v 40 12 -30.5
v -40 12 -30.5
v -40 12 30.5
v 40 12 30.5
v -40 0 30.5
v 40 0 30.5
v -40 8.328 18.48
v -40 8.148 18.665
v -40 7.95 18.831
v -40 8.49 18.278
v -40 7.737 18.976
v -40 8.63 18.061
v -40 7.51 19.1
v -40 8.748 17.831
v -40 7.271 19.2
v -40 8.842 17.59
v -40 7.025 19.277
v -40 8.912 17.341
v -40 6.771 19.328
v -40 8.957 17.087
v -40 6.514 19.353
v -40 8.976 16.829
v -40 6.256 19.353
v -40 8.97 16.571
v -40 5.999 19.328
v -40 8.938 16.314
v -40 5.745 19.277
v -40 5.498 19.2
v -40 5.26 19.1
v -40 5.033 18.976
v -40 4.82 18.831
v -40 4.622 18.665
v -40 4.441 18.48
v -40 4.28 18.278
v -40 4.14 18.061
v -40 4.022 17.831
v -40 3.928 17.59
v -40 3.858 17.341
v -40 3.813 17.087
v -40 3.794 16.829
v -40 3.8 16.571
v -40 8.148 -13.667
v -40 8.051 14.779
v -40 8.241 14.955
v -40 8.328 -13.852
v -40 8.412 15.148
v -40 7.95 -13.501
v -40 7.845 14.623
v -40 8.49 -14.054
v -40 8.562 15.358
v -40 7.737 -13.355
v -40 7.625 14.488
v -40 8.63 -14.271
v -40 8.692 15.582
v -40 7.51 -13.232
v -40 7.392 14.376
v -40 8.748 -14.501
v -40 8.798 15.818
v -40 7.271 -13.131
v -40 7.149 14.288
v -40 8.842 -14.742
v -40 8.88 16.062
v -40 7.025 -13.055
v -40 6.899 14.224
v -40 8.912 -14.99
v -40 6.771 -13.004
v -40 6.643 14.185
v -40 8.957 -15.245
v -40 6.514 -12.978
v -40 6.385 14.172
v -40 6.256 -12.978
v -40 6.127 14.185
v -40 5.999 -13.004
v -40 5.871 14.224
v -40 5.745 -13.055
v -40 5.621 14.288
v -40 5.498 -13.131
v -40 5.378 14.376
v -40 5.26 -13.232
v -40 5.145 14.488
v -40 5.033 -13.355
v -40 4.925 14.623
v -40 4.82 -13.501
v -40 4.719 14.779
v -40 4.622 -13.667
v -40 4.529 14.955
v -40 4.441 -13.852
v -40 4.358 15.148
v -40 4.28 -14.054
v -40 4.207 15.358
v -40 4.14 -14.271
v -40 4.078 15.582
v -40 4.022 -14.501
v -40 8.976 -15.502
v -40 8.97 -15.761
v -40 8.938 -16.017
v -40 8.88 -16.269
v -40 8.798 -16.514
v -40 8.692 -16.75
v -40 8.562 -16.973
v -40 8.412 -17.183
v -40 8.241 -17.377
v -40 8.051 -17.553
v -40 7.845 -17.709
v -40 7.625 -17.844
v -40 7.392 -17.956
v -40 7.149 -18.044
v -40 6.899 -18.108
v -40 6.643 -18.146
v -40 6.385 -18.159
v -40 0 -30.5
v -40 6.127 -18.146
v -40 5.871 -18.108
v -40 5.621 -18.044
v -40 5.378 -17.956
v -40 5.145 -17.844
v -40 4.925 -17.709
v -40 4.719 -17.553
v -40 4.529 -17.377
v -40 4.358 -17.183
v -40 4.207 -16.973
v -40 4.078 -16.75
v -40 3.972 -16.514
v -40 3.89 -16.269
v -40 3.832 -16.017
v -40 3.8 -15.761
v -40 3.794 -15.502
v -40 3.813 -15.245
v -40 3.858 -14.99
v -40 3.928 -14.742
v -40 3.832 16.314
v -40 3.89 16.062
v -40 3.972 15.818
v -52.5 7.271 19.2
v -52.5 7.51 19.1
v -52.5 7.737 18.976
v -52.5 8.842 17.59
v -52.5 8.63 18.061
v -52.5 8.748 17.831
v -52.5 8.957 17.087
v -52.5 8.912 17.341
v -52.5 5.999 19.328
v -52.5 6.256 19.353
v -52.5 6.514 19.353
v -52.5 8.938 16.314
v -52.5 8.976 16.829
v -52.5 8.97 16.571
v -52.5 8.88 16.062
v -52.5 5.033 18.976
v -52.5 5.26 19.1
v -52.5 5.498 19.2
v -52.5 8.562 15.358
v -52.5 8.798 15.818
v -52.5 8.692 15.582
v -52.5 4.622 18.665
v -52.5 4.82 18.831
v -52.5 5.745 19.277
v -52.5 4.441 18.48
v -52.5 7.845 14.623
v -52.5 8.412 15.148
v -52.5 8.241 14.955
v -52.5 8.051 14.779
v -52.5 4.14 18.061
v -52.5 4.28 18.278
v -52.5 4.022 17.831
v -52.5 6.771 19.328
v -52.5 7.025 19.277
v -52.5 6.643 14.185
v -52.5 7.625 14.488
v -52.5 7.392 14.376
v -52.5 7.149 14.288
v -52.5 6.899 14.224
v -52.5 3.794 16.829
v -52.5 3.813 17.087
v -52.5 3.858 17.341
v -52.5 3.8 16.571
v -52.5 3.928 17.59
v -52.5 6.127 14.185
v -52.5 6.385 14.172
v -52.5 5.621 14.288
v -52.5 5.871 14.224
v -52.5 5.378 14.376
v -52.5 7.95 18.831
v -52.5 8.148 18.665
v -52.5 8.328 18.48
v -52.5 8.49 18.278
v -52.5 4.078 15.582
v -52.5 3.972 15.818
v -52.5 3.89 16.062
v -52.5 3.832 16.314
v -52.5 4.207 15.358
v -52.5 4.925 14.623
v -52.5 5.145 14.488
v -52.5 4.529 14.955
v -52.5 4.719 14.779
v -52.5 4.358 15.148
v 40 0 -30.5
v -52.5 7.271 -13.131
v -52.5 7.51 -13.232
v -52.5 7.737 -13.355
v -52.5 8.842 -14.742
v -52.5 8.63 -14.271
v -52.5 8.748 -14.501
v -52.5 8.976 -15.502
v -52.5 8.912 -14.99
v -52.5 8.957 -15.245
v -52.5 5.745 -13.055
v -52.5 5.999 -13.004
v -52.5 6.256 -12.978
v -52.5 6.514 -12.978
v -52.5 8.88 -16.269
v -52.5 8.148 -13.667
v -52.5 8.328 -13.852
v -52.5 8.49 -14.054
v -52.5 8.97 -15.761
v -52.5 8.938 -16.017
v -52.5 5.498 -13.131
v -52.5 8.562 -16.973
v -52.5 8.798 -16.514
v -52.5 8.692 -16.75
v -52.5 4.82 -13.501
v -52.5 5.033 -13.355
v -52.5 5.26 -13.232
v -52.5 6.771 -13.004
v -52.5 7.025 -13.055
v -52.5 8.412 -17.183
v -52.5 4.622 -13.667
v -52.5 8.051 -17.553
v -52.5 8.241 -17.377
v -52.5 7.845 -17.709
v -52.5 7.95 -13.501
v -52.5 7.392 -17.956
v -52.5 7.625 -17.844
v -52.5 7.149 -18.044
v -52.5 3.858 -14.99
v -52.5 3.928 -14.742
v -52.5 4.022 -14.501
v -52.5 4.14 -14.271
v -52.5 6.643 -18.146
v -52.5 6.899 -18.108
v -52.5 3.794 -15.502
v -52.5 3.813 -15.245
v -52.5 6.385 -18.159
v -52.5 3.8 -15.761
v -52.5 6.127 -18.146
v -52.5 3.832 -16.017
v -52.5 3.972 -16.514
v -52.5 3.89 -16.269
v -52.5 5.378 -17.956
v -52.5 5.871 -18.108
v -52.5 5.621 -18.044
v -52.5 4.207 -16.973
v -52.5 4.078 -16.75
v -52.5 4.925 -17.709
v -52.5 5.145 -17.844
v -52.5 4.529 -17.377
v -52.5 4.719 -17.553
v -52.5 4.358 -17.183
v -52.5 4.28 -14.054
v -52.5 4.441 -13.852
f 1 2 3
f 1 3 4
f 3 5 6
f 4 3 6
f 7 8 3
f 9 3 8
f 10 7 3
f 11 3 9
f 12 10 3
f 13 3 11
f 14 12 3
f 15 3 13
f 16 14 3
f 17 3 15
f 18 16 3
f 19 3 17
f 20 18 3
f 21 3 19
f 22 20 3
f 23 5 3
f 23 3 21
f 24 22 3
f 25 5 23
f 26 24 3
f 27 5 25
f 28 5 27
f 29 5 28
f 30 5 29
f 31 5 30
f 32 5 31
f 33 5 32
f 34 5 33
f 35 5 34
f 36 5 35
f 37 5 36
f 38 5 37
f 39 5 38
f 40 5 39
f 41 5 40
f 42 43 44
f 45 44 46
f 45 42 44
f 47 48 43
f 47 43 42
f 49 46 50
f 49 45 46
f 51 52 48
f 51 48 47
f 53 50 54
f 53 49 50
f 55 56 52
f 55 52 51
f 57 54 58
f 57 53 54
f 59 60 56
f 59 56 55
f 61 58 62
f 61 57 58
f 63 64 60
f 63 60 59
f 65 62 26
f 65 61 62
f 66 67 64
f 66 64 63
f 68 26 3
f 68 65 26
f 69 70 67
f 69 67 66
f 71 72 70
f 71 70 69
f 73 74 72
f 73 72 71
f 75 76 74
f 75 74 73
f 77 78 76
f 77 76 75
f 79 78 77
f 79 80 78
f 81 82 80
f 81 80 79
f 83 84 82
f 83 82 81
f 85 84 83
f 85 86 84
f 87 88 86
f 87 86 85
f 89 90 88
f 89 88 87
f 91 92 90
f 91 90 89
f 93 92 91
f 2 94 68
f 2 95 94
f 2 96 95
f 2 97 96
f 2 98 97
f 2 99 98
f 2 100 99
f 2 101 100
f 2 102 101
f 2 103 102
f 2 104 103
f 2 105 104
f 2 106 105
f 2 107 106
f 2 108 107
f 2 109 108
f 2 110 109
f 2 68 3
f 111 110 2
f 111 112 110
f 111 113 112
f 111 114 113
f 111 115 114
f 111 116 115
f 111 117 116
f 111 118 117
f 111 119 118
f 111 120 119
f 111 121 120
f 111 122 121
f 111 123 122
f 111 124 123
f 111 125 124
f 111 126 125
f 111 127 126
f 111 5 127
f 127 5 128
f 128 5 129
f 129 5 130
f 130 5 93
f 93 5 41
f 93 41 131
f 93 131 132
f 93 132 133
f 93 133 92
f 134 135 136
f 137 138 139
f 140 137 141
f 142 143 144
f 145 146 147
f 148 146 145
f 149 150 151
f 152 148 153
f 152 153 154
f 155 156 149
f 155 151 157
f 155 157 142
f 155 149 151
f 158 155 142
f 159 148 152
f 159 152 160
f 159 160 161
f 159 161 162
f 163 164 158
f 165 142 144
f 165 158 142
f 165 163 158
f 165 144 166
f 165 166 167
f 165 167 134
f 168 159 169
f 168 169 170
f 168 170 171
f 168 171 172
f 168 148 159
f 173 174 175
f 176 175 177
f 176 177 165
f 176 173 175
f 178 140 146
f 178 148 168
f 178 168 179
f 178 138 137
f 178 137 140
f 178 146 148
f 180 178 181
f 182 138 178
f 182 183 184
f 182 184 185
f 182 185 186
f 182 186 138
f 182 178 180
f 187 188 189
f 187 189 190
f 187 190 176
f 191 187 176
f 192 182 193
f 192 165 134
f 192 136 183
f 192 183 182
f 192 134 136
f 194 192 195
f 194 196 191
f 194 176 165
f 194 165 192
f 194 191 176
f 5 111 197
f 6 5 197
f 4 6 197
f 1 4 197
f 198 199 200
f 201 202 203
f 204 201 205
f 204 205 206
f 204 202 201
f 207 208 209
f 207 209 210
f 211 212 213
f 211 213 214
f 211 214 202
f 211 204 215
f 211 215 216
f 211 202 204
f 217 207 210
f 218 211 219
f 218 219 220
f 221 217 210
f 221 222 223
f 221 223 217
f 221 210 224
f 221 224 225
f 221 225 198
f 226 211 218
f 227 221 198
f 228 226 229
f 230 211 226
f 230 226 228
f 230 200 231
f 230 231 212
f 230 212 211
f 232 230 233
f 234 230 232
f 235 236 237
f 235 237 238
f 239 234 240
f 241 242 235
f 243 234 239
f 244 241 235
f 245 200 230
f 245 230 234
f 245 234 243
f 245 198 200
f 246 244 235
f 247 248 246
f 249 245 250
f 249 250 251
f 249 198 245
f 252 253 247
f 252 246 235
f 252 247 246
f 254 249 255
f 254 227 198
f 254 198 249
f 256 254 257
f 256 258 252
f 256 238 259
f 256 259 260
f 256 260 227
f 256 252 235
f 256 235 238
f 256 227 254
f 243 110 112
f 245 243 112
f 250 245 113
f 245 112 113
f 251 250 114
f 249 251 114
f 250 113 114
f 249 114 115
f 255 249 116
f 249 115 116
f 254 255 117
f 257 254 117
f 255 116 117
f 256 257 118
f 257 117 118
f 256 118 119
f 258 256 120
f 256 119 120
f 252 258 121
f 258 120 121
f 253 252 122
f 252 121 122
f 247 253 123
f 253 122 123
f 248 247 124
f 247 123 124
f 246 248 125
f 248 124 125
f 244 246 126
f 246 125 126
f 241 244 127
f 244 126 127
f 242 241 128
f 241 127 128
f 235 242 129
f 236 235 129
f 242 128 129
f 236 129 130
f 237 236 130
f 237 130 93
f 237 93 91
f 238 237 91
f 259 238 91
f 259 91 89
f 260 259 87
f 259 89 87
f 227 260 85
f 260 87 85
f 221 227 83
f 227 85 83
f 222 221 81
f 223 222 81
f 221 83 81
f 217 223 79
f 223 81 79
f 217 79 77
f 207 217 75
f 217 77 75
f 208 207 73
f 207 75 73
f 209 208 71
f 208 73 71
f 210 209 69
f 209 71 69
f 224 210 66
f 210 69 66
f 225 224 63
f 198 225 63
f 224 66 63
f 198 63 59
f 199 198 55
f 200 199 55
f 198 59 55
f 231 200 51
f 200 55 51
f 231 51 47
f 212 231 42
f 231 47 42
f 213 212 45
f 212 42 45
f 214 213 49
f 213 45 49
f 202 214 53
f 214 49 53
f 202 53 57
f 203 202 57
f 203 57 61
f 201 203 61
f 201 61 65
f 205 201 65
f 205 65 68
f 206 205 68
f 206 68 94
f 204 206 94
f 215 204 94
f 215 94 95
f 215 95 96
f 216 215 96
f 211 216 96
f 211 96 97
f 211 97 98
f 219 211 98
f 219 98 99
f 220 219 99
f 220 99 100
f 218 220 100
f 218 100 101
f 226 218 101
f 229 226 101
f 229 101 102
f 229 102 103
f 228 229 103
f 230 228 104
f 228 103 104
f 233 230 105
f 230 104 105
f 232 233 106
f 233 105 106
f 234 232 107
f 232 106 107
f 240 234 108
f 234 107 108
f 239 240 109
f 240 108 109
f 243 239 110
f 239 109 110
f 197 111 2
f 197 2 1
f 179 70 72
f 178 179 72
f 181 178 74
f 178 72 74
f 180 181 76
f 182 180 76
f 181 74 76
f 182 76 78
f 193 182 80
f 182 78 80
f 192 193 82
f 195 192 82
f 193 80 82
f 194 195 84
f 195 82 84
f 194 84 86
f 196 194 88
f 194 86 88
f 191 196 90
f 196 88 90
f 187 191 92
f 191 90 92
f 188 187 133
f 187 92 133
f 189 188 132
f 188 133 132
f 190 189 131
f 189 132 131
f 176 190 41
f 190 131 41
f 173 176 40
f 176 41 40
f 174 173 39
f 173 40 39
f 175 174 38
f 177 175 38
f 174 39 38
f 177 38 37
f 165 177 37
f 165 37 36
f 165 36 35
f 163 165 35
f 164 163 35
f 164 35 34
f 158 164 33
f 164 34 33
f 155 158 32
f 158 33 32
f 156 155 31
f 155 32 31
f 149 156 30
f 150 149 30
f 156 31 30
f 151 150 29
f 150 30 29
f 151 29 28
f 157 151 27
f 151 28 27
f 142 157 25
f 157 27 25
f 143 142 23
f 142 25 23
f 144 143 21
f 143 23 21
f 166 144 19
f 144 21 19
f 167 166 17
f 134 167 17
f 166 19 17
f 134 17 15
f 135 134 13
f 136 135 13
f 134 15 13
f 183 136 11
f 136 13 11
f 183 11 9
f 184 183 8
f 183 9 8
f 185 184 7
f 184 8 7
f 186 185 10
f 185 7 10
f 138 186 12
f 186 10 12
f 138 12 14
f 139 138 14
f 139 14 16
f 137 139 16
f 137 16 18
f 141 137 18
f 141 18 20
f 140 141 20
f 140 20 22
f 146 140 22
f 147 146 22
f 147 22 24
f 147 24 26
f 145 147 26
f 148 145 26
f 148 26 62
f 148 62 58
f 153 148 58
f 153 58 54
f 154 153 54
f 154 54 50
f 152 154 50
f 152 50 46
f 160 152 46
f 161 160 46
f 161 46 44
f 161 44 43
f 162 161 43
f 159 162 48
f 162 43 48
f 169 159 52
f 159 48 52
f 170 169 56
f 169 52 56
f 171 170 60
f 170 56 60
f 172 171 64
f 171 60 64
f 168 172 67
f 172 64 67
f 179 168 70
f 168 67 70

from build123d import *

# Parameters (mm, degrees)
SKETCH1_W           = 80
SKETCH1_H           = 61
BOSS_EXTRUDE1_DEPTH = 12
SKETCH2_R           = 2.592161368
BOSS_EXTRUDE2_DEPTH = 12.5


with BuildPart() as part:
    # Sketch1 → Boss-Extrude1 (new body)
    with BuildSketch(Plane(origin=(0, 0, 0), x_dir=(1, 0, 0), z_dir=(0, 1, 0))):
        Rectangle(SKETCH1_W, SKETCH1_H)
    extrude(amount=BOSS_EXTRUDE1_DEPTH)

    # Sketch2 → Boss-Extrude2 (add)
    with BuildSketch(Plane.ZY.offset(40)):
        with Locations((-15.567073505, 6.384900169)):
            Circle(SKETCH2_R)
        with Locations((16.764540698, 6.384900169)):
            Circle(SKETCH2_R)
    extrude(amount=BOSS_EXTRUDE2_DEPTH)


solid = part.part
